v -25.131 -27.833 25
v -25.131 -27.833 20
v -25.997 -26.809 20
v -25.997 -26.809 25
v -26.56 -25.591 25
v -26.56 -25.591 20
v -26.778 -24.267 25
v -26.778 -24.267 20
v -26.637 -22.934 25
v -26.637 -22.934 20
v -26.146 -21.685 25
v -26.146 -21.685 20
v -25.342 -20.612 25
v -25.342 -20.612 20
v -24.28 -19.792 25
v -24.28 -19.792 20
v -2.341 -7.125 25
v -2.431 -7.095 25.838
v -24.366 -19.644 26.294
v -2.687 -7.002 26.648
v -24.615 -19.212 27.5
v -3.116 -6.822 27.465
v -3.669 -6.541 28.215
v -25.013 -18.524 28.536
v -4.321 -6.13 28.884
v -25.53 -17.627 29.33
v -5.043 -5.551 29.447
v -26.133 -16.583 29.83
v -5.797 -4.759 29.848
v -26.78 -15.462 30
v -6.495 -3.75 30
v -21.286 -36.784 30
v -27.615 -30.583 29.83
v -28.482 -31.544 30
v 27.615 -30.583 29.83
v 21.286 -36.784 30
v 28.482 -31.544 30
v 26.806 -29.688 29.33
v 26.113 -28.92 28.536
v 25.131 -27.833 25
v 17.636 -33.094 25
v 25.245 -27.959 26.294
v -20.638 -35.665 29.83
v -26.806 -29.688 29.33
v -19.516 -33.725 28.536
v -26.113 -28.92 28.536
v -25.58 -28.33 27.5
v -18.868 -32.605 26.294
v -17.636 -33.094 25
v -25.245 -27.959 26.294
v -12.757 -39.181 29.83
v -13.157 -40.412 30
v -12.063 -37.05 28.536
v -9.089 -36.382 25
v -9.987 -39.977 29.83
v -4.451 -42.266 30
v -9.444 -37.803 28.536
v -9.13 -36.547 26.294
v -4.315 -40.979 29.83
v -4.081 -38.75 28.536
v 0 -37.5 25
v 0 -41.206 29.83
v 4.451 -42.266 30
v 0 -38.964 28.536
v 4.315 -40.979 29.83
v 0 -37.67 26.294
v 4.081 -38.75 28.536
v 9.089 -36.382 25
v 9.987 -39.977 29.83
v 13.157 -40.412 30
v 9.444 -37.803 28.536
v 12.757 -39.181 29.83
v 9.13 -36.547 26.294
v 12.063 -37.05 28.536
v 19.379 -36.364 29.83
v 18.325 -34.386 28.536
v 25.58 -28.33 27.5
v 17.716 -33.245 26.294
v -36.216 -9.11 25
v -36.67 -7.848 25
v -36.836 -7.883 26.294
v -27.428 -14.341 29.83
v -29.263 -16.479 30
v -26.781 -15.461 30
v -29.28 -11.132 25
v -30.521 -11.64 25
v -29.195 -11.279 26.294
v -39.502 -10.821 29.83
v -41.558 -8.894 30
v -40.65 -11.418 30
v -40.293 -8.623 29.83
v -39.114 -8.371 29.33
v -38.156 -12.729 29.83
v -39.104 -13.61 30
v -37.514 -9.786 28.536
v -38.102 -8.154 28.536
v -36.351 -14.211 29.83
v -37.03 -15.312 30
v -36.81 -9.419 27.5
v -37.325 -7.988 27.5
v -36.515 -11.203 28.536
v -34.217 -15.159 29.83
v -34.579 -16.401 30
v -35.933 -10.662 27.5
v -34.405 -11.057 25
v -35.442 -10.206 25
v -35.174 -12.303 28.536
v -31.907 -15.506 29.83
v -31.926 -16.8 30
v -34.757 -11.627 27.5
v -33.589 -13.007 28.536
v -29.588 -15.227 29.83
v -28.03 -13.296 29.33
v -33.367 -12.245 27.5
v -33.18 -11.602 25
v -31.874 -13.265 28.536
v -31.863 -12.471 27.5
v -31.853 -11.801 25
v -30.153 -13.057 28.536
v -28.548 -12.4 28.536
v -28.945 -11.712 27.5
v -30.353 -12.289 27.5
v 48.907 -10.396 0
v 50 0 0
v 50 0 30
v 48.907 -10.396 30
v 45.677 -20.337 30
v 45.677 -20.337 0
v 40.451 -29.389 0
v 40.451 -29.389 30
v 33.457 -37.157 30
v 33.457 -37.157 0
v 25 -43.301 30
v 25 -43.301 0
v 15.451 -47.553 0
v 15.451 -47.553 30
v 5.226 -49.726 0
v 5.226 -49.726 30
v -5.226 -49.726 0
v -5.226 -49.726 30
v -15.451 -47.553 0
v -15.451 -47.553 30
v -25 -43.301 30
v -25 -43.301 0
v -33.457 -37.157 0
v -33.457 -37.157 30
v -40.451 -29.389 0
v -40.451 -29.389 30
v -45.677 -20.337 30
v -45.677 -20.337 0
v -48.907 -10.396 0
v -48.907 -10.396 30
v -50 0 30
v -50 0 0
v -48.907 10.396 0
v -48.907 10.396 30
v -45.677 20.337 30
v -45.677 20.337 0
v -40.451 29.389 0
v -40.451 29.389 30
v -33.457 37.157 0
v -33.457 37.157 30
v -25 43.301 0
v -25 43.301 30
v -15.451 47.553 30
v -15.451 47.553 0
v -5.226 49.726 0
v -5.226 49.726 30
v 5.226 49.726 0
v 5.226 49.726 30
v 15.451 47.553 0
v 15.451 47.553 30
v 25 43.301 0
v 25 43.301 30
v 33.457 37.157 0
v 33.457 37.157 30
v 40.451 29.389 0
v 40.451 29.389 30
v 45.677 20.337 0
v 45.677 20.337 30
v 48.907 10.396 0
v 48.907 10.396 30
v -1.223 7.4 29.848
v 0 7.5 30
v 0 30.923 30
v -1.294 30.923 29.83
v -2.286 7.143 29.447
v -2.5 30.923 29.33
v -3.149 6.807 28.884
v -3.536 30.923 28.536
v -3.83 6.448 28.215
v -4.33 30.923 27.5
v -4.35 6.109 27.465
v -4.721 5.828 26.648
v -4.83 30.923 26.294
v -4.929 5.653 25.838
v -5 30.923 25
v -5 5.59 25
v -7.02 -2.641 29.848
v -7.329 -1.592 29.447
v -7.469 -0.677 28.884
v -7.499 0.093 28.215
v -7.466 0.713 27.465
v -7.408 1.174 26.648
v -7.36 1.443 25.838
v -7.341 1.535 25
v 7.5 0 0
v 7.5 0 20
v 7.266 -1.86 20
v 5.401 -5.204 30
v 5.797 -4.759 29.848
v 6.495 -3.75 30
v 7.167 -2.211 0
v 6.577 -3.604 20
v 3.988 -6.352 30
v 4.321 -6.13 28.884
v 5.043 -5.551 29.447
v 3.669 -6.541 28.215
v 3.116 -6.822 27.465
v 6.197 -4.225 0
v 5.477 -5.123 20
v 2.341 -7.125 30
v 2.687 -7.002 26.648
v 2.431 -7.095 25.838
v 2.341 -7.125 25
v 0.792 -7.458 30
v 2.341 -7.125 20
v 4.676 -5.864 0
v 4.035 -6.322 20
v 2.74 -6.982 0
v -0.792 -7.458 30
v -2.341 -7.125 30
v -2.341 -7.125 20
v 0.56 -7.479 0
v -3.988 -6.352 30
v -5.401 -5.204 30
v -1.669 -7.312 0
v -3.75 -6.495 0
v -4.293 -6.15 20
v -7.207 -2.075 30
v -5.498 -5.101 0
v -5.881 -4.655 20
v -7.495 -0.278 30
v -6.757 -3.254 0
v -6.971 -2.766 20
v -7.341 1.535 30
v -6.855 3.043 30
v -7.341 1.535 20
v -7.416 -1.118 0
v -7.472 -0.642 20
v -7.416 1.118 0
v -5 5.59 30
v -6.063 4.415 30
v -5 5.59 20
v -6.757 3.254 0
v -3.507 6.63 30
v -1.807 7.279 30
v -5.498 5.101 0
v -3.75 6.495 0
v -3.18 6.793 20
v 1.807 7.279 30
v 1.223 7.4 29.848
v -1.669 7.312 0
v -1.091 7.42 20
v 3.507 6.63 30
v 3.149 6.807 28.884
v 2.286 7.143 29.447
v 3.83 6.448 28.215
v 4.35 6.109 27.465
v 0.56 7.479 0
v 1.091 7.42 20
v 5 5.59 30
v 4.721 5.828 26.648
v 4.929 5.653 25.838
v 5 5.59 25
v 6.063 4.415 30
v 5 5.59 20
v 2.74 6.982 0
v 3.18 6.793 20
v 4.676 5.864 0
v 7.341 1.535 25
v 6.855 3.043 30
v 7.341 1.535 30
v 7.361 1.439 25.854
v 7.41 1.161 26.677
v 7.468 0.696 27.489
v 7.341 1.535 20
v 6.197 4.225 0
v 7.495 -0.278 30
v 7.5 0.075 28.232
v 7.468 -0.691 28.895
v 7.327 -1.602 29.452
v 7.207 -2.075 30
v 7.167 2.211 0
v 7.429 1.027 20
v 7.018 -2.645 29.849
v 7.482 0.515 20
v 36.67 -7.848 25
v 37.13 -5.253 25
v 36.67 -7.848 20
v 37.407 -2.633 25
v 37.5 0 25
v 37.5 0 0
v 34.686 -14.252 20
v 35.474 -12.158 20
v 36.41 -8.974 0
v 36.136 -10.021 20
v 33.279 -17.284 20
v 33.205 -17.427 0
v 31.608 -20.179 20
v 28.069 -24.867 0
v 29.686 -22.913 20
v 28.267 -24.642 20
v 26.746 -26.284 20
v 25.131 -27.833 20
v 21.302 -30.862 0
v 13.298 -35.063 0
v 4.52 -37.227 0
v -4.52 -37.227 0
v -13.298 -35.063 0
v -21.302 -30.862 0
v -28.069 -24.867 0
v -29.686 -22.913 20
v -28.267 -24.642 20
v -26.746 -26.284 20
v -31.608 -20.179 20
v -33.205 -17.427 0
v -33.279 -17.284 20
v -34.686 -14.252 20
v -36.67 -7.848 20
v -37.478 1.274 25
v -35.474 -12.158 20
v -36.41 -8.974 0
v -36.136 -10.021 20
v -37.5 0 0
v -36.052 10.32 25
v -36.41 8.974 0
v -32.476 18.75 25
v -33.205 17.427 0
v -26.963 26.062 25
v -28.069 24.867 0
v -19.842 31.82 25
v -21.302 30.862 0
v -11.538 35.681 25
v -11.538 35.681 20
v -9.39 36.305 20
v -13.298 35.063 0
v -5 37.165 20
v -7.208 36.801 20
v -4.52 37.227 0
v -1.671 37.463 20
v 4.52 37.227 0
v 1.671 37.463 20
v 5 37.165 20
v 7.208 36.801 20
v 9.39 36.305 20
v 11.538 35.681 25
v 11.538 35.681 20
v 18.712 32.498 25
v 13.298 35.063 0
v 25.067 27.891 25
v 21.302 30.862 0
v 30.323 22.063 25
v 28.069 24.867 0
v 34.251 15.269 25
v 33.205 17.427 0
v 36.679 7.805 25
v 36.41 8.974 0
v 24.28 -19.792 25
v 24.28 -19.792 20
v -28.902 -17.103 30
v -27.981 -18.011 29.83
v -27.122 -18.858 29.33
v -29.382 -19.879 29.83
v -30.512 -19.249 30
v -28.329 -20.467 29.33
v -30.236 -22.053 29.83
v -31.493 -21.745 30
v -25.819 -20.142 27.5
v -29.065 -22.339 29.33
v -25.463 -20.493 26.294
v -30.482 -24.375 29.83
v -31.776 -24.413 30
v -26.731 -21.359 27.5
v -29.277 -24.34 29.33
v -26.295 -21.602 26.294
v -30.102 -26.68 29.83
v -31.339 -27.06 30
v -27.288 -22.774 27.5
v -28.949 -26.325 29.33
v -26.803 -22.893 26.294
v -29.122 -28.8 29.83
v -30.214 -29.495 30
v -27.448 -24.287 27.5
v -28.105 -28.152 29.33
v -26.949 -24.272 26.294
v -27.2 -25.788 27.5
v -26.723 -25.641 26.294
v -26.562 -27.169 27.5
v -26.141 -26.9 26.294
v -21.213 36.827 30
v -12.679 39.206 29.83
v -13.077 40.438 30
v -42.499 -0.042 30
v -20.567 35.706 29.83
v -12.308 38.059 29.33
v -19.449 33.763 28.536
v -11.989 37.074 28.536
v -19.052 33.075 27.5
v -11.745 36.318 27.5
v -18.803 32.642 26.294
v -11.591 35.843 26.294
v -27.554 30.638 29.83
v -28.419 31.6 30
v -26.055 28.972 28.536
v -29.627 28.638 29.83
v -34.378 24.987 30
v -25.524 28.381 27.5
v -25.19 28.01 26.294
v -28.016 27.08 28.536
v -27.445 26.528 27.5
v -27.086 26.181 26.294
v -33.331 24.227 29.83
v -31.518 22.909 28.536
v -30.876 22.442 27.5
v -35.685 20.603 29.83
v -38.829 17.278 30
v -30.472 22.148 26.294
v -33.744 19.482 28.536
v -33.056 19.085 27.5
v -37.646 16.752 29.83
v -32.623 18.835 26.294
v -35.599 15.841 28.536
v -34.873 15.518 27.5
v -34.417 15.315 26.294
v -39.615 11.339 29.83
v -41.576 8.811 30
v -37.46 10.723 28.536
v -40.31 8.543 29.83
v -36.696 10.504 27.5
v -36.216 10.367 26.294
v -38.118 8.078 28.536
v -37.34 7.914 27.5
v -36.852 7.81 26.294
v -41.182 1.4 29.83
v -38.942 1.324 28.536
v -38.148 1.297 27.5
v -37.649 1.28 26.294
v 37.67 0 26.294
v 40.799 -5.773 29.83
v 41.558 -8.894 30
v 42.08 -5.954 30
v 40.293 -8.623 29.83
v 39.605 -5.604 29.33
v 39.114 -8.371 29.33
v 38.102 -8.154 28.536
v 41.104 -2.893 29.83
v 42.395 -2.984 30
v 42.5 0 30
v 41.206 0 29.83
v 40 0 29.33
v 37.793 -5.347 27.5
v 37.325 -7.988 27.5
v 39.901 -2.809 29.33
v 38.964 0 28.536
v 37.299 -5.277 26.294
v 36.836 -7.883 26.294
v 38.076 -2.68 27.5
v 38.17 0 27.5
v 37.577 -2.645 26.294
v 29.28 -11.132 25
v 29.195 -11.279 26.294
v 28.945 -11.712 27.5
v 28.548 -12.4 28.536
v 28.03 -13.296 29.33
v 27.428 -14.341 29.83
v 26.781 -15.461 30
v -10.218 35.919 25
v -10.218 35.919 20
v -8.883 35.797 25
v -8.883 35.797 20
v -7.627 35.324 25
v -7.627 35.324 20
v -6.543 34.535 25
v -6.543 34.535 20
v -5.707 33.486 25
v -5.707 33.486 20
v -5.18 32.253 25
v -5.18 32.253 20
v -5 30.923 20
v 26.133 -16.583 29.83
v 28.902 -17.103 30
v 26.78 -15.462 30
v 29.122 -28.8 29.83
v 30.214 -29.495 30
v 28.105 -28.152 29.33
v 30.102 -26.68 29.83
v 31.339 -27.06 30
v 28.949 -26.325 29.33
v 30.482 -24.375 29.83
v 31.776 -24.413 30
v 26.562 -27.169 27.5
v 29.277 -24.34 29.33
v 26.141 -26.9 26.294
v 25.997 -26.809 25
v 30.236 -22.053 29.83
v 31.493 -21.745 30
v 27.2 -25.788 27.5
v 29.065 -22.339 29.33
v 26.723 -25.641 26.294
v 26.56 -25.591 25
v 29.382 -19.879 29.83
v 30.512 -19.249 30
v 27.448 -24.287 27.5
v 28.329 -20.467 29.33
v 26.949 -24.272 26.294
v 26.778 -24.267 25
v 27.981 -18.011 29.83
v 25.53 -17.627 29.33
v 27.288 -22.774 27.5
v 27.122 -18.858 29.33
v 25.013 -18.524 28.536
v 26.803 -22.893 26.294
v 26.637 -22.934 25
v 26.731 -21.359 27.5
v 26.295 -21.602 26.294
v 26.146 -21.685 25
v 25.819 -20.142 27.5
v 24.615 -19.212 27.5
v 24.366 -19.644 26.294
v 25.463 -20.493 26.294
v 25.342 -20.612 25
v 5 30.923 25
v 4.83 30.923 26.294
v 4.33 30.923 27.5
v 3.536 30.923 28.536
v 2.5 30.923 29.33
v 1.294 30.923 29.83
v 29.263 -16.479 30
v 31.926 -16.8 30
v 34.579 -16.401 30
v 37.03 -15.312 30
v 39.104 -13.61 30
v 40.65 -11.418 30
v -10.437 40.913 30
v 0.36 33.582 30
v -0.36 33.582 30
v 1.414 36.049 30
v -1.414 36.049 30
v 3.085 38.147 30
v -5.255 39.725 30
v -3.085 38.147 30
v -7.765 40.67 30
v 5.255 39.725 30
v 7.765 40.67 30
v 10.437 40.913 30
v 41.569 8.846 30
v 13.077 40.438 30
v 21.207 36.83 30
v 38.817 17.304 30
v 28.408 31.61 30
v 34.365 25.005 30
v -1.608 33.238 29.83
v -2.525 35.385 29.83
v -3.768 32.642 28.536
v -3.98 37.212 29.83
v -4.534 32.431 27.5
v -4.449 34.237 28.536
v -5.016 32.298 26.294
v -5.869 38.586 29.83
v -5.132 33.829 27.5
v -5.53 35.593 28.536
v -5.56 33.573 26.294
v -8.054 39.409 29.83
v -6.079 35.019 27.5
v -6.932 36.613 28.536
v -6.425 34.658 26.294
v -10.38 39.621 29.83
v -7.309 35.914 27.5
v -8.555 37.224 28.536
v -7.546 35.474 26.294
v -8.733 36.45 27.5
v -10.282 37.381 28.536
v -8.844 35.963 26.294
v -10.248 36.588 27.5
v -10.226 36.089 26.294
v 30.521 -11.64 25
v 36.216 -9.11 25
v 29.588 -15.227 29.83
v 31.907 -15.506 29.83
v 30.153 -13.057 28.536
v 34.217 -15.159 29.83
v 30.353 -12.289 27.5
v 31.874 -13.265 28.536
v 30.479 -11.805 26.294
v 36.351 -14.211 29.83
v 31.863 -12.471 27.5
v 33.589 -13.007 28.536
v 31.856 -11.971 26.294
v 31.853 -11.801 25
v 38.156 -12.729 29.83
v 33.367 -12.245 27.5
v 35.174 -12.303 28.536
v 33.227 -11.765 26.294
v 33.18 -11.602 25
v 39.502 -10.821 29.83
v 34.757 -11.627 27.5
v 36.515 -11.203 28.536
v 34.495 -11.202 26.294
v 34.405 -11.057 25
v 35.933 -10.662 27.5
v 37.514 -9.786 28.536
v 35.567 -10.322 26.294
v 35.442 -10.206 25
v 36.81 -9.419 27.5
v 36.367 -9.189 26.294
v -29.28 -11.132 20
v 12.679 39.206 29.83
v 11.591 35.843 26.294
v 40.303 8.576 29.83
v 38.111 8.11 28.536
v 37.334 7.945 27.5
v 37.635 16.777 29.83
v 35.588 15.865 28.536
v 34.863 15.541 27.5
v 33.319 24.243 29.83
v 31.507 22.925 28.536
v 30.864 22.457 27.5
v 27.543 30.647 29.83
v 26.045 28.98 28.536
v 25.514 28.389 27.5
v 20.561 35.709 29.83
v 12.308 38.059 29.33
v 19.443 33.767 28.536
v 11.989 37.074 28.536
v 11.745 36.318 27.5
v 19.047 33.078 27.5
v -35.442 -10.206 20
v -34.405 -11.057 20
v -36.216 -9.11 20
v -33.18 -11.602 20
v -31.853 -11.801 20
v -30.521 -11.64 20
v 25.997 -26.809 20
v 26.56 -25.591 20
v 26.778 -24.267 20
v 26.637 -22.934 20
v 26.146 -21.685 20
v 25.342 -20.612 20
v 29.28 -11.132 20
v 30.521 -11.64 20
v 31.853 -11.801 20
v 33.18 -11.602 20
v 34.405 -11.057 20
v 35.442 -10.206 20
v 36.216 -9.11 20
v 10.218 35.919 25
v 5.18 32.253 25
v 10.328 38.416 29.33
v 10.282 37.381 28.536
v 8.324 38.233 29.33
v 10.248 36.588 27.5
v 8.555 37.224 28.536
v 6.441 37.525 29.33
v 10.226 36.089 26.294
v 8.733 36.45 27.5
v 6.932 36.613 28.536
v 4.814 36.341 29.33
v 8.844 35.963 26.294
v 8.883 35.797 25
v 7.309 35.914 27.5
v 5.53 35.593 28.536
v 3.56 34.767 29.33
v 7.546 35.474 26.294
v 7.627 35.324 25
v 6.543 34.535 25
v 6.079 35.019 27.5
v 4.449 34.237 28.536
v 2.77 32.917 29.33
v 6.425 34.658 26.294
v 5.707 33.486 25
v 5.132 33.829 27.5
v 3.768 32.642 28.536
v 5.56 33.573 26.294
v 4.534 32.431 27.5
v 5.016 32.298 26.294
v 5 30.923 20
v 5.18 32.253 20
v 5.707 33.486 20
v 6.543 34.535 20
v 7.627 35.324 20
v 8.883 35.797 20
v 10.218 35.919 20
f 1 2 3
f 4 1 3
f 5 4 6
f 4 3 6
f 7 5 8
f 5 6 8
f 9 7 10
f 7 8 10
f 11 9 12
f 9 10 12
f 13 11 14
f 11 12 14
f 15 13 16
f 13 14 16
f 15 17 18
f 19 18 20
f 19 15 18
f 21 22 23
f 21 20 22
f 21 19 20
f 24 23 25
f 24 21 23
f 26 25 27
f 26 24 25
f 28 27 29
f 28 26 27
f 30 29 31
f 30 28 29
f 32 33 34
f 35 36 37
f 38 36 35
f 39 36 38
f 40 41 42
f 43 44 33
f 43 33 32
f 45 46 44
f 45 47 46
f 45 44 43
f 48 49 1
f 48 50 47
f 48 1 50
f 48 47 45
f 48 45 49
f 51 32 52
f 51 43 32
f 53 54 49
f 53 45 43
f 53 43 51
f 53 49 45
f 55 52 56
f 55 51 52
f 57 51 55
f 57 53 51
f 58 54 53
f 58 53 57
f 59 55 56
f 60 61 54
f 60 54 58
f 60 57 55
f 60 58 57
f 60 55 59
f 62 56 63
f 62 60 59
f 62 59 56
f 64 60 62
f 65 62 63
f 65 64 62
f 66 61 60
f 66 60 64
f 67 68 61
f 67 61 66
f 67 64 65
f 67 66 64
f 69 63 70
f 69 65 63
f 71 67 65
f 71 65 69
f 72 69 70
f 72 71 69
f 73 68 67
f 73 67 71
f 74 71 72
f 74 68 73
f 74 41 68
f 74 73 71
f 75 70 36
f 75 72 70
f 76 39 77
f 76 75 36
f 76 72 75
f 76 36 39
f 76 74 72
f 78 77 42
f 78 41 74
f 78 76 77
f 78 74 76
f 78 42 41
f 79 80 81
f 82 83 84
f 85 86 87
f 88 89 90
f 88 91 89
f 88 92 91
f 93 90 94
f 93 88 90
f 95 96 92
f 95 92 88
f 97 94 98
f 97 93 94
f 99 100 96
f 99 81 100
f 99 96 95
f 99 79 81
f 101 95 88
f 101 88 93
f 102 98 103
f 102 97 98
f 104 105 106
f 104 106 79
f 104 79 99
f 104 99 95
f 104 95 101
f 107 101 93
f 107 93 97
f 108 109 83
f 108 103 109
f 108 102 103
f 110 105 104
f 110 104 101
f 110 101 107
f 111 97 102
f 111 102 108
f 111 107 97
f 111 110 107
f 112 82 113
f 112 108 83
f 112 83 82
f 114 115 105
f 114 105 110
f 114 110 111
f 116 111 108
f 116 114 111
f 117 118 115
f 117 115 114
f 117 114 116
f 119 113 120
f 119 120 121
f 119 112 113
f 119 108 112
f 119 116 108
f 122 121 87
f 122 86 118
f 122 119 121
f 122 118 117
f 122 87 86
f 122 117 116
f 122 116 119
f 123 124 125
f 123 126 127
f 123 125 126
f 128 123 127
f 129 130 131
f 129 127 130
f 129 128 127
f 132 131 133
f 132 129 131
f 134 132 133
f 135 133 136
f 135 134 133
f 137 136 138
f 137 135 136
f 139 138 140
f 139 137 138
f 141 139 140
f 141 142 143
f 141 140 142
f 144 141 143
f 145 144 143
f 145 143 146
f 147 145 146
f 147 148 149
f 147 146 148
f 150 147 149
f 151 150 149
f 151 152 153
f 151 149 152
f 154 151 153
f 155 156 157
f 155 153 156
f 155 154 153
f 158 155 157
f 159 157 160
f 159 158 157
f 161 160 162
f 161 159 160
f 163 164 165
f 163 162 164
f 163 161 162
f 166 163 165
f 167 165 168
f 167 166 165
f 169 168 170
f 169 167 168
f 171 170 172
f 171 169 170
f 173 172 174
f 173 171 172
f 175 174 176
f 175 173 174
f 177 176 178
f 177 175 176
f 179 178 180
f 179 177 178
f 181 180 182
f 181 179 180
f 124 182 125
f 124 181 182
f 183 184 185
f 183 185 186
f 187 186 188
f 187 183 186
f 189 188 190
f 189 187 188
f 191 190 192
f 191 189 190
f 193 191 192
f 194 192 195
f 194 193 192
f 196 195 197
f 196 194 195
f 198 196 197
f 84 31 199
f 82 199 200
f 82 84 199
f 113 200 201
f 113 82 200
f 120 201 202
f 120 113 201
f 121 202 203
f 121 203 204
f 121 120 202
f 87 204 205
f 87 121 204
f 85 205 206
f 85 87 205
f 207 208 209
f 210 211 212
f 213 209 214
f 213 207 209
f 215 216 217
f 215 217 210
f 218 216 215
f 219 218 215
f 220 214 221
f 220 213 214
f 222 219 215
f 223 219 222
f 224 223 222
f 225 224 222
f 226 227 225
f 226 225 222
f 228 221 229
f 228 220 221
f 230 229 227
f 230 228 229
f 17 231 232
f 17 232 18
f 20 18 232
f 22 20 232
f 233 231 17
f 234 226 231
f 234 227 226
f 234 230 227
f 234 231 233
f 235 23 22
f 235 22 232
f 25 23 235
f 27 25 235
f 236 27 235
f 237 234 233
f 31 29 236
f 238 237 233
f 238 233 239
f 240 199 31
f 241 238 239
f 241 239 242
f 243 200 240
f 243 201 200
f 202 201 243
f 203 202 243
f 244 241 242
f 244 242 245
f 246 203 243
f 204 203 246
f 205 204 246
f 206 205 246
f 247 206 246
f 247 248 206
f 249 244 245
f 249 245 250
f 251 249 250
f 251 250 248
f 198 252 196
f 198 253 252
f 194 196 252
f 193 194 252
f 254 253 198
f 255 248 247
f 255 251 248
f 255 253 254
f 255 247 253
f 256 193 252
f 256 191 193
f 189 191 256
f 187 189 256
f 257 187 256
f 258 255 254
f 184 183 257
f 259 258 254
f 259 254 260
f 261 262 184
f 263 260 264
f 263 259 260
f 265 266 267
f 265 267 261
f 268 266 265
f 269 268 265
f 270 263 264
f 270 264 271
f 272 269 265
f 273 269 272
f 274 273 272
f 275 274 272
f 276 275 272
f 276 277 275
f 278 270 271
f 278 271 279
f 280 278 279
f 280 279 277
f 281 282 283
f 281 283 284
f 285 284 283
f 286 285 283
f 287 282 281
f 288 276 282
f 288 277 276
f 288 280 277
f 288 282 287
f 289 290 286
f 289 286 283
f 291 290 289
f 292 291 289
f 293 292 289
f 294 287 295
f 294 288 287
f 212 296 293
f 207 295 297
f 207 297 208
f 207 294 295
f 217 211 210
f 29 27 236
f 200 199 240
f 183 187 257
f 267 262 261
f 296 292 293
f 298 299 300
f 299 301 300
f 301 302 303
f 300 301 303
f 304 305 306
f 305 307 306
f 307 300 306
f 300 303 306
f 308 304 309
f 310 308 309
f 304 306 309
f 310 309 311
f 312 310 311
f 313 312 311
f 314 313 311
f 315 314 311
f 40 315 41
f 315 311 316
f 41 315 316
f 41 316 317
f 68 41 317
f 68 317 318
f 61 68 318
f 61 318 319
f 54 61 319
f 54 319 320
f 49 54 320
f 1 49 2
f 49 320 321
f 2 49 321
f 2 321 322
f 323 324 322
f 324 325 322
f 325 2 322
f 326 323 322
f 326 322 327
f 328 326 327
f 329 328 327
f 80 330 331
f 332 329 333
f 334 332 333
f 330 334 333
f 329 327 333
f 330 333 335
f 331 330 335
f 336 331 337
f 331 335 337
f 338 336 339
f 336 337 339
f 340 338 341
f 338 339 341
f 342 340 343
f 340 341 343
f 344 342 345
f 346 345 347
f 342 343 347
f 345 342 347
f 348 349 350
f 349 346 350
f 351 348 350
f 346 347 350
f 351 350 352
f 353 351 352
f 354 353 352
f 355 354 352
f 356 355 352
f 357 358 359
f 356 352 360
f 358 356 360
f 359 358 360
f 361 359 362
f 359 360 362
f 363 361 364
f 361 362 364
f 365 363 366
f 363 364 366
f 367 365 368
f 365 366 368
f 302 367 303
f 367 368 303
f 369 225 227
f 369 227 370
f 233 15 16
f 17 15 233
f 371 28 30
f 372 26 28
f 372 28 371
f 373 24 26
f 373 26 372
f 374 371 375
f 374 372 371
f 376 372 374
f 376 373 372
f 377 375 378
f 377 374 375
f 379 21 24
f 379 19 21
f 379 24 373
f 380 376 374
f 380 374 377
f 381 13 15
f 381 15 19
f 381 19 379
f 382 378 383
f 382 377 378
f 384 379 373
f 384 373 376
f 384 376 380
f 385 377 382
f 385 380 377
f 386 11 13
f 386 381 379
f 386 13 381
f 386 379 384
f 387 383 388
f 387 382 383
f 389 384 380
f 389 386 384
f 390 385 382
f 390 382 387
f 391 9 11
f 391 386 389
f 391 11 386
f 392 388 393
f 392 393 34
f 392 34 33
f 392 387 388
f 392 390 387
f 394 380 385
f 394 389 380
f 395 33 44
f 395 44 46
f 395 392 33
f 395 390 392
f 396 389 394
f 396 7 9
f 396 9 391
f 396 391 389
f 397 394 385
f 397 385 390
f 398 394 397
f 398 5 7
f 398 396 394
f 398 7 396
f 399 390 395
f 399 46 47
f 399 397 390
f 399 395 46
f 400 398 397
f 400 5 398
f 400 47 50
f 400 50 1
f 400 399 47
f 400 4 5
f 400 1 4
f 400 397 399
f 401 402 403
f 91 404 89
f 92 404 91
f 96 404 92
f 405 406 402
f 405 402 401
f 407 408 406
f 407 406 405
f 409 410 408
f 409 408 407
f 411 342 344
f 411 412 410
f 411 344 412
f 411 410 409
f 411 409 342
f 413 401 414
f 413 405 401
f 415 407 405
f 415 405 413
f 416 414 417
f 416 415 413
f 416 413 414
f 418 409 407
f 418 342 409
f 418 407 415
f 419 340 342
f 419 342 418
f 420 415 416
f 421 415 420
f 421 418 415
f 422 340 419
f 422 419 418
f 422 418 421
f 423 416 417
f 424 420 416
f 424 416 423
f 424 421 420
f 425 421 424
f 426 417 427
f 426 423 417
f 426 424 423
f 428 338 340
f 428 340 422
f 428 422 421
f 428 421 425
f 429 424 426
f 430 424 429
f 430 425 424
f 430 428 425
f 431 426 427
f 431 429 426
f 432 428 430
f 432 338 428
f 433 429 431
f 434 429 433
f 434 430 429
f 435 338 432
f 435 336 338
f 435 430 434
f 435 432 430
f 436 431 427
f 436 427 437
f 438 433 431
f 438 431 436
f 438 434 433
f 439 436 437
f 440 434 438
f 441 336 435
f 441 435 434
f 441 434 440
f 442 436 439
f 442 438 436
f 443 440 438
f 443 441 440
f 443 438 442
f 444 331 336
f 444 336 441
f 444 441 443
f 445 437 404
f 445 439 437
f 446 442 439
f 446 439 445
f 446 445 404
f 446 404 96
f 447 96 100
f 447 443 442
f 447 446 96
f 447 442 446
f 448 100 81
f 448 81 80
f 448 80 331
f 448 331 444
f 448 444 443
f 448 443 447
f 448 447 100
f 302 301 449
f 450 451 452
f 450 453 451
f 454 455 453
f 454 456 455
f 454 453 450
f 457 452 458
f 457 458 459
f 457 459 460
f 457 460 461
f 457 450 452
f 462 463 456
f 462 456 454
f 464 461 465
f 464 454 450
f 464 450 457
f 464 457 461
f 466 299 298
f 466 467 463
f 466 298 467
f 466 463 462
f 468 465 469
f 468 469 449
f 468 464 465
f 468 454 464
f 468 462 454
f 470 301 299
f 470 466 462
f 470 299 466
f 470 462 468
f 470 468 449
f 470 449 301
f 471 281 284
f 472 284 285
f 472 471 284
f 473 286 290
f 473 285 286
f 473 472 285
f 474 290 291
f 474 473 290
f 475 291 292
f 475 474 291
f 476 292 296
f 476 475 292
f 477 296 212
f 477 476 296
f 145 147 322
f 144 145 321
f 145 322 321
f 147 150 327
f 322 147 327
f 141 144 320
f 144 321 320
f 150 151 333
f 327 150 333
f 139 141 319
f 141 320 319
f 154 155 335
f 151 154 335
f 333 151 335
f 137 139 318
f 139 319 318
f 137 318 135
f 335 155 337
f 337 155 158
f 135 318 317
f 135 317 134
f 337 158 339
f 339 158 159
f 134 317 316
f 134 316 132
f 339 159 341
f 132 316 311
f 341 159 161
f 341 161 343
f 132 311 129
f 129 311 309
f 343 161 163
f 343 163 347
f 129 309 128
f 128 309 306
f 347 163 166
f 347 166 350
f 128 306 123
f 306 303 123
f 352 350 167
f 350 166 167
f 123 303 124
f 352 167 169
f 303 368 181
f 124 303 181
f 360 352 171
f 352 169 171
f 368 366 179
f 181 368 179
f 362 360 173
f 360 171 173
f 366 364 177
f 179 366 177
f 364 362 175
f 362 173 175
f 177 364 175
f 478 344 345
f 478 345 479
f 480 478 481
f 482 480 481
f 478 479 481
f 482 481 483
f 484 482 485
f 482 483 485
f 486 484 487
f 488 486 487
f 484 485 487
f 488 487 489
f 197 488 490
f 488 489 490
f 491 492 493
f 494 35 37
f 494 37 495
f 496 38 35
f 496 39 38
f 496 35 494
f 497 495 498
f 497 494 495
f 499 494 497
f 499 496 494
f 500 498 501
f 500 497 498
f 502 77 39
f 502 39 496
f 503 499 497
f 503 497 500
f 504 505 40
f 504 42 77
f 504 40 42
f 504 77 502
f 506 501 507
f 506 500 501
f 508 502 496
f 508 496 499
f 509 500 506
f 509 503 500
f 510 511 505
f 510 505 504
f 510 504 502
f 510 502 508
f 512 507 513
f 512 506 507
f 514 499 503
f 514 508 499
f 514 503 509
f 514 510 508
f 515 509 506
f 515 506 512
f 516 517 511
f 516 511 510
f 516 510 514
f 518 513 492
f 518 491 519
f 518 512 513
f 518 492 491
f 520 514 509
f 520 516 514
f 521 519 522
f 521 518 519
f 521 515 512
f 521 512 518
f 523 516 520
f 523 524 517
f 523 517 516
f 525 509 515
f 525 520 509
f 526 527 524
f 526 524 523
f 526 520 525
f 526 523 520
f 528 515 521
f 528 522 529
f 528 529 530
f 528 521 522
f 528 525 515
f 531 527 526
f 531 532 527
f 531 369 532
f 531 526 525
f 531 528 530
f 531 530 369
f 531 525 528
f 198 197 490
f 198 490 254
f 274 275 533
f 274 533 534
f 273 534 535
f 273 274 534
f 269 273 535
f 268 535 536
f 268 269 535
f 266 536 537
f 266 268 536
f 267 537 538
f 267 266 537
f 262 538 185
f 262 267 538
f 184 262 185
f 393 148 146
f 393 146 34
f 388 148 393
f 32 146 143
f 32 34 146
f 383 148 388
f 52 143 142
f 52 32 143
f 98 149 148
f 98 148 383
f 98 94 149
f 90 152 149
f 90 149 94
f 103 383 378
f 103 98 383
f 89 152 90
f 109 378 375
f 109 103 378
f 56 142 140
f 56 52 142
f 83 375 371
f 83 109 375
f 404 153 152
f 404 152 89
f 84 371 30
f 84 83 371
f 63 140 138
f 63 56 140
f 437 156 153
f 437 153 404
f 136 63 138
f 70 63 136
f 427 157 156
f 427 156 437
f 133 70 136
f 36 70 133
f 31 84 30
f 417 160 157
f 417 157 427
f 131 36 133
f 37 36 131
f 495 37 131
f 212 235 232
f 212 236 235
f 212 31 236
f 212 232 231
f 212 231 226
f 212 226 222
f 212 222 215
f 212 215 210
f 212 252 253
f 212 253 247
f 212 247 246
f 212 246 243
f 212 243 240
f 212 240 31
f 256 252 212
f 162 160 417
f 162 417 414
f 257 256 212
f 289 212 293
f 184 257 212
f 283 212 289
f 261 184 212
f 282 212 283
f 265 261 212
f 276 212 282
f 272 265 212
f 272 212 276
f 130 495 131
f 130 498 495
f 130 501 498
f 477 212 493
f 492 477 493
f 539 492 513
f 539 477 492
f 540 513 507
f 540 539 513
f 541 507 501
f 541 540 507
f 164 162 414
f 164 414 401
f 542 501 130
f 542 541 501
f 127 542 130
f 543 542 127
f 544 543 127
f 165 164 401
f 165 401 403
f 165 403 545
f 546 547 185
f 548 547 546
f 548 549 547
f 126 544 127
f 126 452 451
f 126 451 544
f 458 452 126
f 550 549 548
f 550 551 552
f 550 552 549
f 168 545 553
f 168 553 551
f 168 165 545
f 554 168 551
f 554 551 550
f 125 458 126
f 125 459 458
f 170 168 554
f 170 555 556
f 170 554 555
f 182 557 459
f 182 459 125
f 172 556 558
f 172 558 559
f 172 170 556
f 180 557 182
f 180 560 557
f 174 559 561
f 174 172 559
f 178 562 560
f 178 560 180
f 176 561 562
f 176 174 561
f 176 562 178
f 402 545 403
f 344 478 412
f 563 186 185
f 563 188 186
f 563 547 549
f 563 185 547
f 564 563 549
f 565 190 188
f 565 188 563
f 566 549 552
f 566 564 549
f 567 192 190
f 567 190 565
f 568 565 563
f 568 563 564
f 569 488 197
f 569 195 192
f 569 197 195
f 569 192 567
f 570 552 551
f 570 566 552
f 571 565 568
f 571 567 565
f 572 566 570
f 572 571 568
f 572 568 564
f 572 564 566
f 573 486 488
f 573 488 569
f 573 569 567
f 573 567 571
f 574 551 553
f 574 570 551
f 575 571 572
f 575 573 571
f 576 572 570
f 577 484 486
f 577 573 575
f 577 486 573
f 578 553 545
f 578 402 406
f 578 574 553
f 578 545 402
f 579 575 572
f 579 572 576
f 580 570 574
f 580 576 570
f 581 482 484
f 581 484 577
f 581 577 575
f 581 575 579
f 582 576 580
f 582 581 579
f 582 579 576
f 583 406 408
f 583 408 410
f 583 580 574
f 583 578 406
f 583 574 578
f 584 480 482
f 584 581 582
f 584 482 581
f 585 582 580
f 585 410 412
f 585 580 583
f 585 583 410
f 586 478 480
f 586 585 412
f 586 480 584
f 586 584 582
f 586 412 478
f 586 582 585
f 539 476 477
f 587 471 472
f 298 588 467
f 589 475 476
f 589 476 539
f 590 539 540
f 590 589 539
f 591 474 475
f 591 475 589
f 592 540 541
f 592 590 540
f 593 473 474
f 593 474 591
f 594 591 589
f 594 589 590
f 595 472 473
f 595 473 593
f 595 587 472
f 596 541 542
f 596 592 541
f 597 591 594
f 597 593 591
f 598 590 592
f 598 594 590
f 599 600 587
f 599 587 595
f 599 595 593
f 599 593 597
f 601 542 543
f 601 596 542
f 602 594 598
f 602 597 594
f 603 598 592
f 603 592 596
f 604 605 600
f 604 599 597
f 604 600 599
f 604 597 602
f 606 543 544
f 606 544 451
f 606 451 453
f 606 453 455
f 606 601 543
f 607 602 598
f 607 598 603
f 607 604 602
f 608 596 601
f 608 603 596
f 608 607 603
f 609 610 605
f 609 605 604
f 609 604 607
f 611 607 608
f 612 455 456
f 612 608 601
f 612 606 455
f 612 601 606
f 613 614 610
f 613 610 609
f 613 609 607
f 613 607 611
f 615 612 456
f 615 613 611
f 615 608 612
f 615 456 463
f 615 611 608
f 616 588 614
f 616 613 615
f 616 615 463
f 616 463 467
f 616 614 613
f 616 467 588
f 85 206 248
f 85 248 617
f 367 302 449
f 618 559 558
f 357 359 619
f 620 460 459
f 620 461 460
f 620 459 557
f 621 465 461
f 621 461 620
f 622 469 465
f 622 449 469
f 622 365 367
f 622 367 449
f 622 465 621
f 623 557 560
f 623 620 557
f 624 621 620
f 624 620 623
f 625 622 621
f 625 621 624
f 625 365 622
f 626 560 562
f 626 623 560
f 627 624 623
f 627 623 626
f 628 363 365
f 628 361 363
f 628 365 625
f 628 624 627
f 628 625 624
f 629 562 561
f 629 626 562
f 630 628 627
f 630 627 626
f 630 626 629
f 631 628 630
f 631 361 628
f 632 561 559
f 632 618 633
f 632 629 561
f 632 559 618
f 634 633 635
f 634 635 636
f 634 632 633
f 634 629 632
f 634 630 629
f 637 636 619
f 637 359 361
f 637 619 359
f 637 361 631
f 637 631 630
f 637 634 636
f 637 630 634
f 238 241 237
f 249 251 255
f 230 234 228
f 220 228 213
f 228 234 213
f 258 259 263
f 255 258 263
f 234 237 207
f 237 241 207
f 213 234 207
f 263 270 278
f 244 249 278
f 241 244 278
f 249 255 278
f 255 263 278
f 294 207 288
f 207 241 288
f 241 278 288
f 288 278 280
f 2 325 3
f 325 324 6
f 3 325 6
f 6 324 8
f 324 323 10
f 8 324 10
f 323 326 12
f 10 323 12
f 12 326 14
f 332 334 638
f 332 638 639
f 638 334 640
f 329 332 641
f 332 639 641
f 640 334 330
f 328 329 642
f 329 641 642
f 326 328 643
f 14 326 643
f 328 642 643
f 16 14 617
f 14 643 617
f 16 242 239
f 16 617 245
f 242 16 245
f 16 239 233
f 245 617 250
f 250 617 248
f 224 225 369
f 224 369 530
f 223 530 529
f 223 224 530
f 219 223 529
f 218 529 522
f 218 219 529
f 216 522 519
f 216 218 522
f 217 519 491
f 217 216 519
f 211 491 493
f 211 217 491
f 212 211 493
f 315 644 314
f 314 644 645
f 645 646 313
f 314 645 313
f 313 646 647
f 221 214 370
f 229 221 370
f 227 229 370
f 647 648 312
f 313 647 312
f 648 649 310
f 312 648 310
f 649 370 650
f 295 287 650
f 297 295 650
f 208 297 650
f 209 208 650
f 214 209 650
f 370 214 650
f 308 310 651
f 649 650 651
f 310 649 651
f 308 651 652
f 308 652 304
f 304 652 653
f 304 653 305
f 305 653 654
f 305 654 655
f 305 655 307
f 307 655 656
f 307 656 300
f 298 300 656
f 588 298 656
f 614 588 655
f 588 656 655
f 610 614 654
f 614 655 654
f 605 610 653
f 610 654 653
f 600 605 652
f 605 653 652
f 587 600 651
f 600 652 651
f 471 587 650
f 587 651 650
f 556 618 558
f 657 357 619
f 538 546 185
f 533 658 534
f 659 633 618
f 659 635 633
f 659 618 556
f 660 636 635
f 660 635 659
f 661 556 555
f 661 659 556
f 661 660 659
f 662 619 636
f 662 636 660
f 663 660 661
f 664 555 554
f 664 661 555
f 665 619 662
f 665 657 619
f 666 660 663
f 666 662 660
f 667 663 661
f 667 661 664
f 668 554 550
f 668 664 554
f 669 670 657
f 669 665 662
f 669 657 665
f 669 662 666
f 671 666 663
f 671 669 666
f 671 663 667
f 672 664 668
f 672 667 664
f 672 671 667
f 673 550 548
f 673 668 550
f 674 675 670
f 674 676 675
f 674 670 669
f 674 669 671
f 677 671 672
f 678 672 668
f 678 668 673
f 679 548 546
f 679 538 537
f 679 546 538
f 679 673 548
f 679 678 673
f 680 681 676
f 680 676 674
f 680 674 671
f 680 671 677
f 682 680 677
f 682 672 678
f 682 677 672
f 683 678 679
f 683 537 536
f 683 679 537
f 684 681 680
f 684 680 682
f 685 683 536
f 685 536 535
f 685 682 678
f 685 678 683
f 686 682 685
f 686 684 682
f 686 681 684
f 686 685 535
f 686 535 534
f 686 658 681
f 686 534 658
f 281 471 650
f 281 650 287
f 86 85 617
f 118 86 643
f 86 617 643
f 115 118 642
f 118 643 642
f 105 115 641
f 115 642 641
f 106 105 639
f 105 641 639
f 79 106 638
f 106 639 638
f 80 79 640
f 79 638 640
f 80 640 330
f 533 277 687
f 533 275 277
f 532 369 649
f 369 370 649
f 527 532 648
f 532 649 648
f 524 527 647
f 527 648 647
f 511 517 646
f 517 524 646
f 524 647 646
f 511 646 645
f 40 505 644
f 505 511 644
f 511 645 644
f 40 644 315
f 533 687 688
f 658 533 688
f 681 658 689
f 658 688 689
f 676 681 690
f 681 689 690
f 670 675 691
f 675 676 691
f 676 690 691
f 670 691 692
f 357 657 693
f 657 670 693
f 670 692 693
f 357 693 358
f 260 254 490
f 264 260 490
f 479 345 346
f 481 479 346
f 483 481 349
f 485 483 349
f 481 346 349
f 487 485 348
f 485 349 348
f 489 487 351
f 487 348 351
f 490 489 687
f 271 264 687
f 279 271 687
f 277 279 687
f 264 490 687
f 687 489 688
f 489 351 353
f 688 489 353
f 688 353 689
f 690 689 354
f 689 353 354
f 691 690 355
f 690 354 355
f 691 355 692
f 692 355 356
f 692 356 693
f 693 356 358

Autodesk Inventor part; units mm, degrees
ref_plane "YZ Plane" through (0, 0, 0) normal (1, 0, 0) x (0, 1, 0)
ref_plane "XZ Plane" through (0, 0, 0) normal (0, 1, 0) x (-1, 0, 0)
ref_plane "XY Plane" through (0, 0, 0) normal (0, 0, 1) x (1, 0, 0)
sketch "Schizzo1" plane through (0, 0, 0) normal (0, 0, 1) x (1, 0, 0)
  circle A0 centre (0, 0) radius 50
  circle A1 centre (0, 0) radius 37.5
  circle A2 centre (0, 0) radius 7.5
  dimension "d0" = 100
  dimension "d1" = 75
  dimension "d2" = 15
extrude "Estrusione1" add sketch "Schizzo1" along normal blind 30
sketch "Schizzo2" plane through (0, 0, 30) normal (0, 0, 1) x (1, 0, 0)
  line L0 (-5, 39.5) -> (-5, 4.5)
  line L1 (-5, 4.5) -> (5, 4.5)
  line L2 (5, 4.5) -> (5, 39.5)
  line L3 (5, 39.5) -> (-5, 39.5)
  line L4 (-5, 39.5) -> (5, 4.5) construction
  line L5 (-5, 4.5) -> (5, 39.5) construction
  line L6 (-31.708, -24.0801) -> (-1.3971, -6.5801)
  line L7 (-1.3971, -6.5801) -> (-6.3971, 2.0801)
  line L8 (-6.3971, 2.0801) -> (-36.708, -15.4199)
  line L9 (-36.708, -15.4199) -> (-31.708, -24.0801)
  line L10 (-31.708, -24.0801) -> (-6.3971, 2.0801) construction
  line L11 (-1.3971, -6.5801) -> (-36.708, -15.4199) construction
  line L12 (36.708, -15.4199) -> (6.3971, 2.0801)
  line L13 (6.3971, 2.0801) -> (1.3971, -6.5801)
  line L14 (1.3971, -6.5801) -> (31.708, -24.0801)
  line L15 (31.708, -24.0801) -> (36.708, -15.4199)
  line L16 (36.708, -15.4199) -> (1.3971, -6.5801) construction
  line L17 (6.3971, 2.0801) -> (31.708, -24.0801) construction
  point P0 (0, 0)
  point P1 (0, 22)
  point P2 (-19.0526, -11)
  point P3 (19.0526, -11)
  dimension "d5" = 22
  dimension "d6" = 0
  dimension "d7" = 10
  dimension "d8" = 35
  dimension "d11" = 360
extrude "Estrusione2" add sketch "Schizzo2" against normal blind 10
fillet "Raccordo1" radius 5 6 edges at (-34.686, -14.2525, 25) (5, 37.1652, 25) (34.686, -14.2525, 25) (-5, 37.1652, 25) (29.686, -22.9127, 25) (-29.686, -22.9127, 25)
fillet "Raccordo2" radius 5 10 edges at (0, -37.5, 30) (13.3108, -13.4585, 30) (-13.3108, -13.4585, 30) (-5, 18.2567, 30) (-18.3108, -4.7982, 30) (-32.476, 18.75, 30) (30.3228, 22.0631, 30) (37.2918, -3.9458, 30) (18.3108, -4.7982, 30) (5, 18.2567, 30)
properties part number "wheel"
